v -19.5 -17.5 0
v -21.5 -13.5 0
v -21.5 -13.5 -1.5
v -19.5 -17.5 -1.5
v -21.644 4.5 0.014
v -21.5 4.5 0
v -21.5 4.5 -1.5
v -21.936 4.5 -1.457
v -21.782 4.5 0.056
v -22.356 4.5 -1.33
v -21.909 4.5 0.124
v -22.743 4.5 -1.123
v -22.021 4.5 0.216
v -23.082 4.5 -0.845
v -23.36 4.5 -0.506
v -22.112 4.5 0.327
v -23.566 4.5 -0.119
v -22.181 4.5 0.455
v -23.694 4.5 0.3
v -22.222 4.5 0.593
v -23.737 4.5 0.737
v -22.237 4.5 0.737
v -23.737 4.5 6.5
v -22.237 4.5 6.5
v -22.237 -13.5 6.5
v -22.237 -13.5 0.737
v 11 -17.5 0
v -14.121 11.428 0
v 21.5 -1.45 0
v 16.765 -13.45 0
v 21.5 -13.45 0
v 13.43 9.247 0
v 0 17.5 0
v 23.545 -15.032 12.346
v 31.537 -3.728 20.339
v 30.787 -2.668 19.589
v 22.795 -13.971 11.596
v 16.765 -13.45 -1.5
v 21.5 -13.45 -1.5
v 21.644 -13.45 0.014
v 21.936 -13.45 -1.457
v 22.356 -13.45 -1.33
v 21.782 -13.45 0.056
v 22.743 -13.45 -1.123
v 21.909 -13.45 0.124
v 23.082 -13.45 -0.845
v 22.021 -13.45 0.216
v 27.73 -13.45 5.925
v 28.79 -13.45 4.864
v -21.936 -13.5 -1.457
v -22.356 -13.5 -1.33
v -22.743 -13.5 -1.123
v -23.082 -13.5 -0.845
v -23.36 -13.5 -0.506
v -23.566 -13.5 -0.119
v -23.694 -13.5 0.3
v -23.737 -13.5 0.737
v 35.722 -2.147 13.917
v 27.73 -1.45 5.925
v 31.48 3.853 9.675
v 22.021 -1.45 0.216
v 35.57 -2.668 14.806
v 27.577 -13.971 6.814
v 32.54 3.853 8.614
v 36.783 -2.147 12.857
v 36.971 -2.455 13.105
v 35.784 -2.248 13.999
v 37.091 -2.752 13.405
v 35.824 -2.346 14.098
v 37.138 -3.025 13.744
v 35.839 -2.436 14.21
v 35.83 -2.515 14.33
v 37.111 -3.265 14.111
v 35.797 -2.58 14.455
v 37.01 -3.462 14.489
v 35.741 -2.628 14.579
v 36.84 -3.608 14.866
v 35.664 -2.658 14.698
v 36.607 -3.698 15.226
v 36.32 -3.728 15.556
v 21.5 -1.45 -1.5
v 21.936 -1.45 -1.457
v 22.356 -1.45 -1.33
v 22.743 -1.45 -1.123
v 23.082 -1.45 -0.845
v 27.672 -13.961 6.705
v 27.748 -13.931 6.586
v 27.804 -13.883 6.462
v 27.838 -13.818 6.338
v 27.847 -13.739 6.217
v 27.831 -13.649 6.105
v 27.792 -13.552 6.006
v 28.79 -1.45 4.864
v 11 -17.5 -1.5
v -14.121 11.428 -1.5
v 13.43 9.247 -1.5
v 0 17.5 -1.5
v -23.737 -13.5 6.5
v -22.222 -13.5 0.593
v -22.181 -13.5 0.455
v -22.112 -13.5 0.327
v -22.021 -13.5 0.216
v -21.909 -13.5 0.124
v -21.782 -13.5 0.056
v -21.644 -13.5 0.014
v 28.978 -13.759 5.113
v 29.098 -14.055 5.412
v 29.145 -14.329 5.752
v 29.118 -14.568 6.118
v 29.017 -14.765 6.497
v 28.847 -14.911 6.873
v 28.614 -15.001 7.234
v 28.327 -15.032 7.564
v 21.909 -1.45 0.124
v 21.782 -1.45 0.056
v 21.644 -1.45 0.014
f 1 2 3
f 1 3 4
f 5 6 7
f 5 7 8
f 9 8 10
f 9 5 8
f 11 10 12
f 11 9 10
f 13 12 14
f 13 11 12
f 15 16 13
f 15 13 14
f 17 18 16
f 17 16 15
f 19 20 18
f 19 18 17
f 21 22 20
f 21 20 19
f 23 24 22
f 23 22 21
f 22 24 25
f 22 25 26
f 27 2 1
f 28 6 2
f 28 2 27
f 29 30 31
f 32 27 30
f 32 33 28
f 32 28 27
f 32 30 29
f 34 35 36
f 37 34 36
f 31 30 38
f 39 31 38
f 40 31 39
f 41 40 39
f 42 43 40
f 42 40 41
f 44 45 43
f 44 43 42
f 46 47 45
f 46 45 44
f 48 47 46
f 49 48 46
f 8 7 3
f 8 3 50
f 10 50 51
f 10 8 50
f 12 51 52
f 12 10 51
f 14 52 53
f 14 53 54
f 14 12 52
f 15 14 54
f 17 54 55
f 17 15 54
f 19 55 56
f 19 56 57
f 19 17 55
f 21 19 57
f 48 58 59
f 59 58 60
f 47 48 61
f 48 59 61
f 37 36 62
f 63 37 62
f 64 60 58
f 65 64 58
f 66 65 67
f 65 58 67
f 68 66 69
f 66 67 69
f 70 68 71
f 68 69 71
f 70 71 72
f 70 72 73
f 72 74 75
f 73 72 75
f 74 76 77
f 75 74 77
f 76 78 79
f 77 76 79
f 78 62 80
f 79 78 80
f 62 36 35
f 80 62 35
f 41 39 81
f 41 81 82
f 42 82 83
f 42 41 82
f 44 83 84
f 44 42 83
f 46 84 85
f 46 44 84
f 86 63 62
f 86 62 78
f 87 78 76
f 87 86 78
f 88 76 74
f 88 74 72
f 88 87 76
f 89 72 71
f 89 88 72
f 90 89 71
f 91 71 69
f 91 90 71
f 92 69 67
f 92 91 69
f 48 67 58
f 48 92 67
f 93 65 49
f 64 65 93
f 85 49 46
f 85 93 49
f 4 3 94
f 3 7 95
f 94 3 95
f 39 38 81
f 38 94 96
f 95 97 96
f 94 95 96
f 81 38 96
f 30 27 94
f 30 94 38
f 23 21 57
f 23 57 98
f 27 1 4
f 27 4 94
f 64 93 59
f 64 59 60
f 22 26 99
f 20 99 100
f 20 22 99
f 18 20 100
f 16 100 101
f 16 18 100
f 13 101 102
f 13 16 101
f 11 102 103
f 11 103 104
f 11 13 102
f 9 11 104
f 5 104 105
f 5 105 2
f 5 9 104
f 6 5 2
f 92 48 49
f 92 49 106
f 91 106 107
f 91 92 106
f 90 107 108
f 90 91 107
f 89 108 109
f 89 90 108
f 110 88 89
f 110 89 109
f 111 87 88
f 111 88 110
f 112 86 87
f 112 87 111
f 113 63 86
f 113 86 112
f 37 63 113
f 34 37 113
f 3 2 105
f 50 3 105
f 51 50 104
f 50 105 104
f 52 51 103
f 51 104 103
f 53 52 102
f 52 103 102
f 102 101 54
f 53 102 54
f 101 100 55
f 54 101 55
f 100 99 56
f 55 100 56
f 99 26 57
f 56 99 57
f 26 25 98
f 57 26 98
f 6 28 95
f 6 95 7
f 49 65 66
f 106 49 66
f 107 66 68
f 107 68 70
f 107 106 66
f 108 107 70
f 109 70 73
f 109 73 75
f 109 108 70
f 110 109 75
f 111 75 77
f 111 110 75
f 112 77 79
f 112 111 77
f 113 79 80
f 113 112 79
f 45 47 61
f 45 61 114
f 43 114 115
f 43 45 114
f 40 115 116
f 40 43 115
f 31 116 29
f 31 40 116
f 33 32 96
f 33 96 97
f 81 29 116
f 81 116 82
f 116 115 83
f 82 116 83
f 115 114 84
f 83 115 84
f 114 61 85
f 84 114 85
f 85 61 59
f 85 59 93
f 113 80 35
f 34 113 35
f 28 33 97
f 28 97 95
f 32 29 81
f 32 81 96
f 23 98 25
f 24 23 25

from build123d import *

# Parameters (mm, degrees)
CROQUIS1_W              = 43
CROQUIS1_H              = 35
BRIDA_BASE1_DEPTH       = 1.5
CROQUIS6_W              = 59.566817112
CROQUIS6_H              = 45.88022185
CORTAR_EXTRUIR1_DEPTH   = 10
BRIDA_DE_ARISTA1_DEPTH  = 18
BRIDA_DE_ARISTA2_DEPTH  = 12
CORTAR_EXTRUIR2_DEPTH   = 10
SALIENTE_EXTRUIR1_DEPTH = 1.5
CORTAR_EXTRUIR3_DEPTH   = 10
BRIDA_DE_ARISTA3_DEPTH  = 15.985281374


# Sheet-metal steps are written as plain solids
with BuildPart() as part:
    # Croquis1 → Brida base1 (new body)
    with BuildSketch(Plane.XY):
        Rectangle(CROQUIS1_W, CROQUIS1_H)
    extrude(amount=-BRIDA_BASE1_DEPTH)

    # Croquis6 → Cortar-Extruir1 (cut)
    with BuildSketch(Plane.XY):
        Rectangle(CROQUIS6_W, CROQUIS6_H)
        Polygon((11, -17.5), (16.764888282, -13.45), (21.5, -13.45), (21.5, -1.45), (13.429731846, 9.247432799), (0, 17.5), (-14.121485549, 11.428046656), (-21.5, 4.5), (-21.5, -13.5), (-19.5, -17.5), align=None, mode=Mode.SUBTRACT)
    extrude(amount=-CORTAR_EXTRUIR1_DEPTH, mode=Mode.SUBTRACT)

    # Brida de arista1 section (across the edge) → Brida de arista1 (add)
    with BuildSketch(Plane(origin=(-22.2366, 4.5, 0), x_dir=(1, 0, 0), z_dir=(0, -1, 0))):
        with BuildLine():
            Line((-1.5, 0.7366), (-1.5, 6.5))
            Line((-1.5, 6.5), (0, 6.5))
            Line((0, 6.5), (0, 0.7366))
            ThreePointArc((0, 0.7366), (0.215745145, 0.215745145), (0.7366, 0))
            Line((0.7366, 0), (0.7366, -1.5))
            ThreePointArc((0.7366, -1.5), (-0.844915027, -0.844915027), (-1.5, 0.7366))
        make_face()
    extrude(amount=BRIDA_DE_ARISTA1_DEPTH)

    # Brida de arista2 section (across the edge) → Brida de arista2 (add)
    with BuildSketch(Plane(origin=(21.80510971, -13.45, 0), x_dir=(-0.7071067811865438, 0, 0.7071067811865512), z_dir=(0, 1, 0))):
        with BuildLine():
            Line((-1.5, 0.30510971), (-1.5, 20.378679656))
            Line((-1.5, 20.378679656), (0, 20.378679656))
            Line((0, 20.378679656), (0, 0.30510971))
            ThreePointArc((0, 0.30510971), (0.056070336, 0.023225094), (0.215745145, -0.215745145))
            Line((0.215745145, -0.215745145), (-0.844915027, -1.276405317))
            ThreePointArc((-0.844915027, -1.276405317), (-1.329748962, -0.550800055), (-1.5, 0.30510971))
        make_face()
    extrude(amount=BRIDA_DE_ARISTA2_DEPTH)

    # Croquis13 → Cortar-Extruir2 (cut)
    with BuildSketch(Plane(origin=(11.963215027, 0, -11.963215027), x_dir=(-0.7071067811865513, 0, -0.7071067811865438), z_dir=(0.7071067811865438, 0, -0.7071067811865513))):
        Polygon((-35.797220597, -1.45), (-23.797220597, -13.45), (-35.797220597, -13.45), align=None)
    extrude(amount=-CORTAR_EXTRUIR2_DEPTH, mode=Mode.SUBTRACT)

    # Croquis14 → Saliente-Extruir1 (add)
    with BuildSketch(Plane(origin=(11.963215027, 0, -11.963215027), x_dir=(-0.7071067811865513, 0, -0.7071067811865438), z_dir=(0.7071067811865438, 0, -0.7071067811865513))):
        Polygon((-35.797220597, -1.45), (-23.797220597, -1.45), (-30.161181628, 4.913961031), (-36.161181628, -1.086038969), align=None)
    extrude(amount=-SALIENTE_EXTRUIR1_DEPTH)

    # Croquis15 → Cortar-Extruir3 (cut)
    with BuildSketch(Plane(origin=(10.902554855, 0, -10.902554855), x_dir=(0.7071067811865513, 0, 0.7071067811865438), z_dir=(-0.7071067811865438, 0, 0.7071067811865513))):
        Polygon((30.161181628, 4.913961031), (36.161181628, -1.086038969), (35.100521456, -2.146699141), (29.100521456, 3.853300859), align=None)
    extrude(amount=-CORTAR_EXTRUIR3_DEPTH, mode=Mode.SUBTRACT)

    # Brida de arista3 section (across the edge) → Brida de arista3 (add)
    with BuildSketch(Plane(origin=(28.098030913, -13.970854855, 6.292921202), x_dir=(-0.5000000000000027, 0.7071067811865511, -0.4999999999999924), z_dir=(0.5000000000000054, 0.7071067811865441, 0.49999999999999967))):
        with BuildLine():
            Line((-1.5, 0.7366), (-1.5, 7.5))
            Line((-1.5, 7.5), (0, 7.5))
            Line((0, 7.5), (0, 0.7366))
            ThreePointArc((0, 0.7366), (0.215745145, 0.215745145), (0.7366, 0))
            Line((0.7366, 0), (0.7366, -1.5))
            ThreePointArc((0.7366, -1.5), (-0.844915027, -0.844915027), (-1.5, 0.7366))
        make_face()
    extrude(amount=BRIDA_DE_ARISTA3_DEPTH)


solid = part.part
